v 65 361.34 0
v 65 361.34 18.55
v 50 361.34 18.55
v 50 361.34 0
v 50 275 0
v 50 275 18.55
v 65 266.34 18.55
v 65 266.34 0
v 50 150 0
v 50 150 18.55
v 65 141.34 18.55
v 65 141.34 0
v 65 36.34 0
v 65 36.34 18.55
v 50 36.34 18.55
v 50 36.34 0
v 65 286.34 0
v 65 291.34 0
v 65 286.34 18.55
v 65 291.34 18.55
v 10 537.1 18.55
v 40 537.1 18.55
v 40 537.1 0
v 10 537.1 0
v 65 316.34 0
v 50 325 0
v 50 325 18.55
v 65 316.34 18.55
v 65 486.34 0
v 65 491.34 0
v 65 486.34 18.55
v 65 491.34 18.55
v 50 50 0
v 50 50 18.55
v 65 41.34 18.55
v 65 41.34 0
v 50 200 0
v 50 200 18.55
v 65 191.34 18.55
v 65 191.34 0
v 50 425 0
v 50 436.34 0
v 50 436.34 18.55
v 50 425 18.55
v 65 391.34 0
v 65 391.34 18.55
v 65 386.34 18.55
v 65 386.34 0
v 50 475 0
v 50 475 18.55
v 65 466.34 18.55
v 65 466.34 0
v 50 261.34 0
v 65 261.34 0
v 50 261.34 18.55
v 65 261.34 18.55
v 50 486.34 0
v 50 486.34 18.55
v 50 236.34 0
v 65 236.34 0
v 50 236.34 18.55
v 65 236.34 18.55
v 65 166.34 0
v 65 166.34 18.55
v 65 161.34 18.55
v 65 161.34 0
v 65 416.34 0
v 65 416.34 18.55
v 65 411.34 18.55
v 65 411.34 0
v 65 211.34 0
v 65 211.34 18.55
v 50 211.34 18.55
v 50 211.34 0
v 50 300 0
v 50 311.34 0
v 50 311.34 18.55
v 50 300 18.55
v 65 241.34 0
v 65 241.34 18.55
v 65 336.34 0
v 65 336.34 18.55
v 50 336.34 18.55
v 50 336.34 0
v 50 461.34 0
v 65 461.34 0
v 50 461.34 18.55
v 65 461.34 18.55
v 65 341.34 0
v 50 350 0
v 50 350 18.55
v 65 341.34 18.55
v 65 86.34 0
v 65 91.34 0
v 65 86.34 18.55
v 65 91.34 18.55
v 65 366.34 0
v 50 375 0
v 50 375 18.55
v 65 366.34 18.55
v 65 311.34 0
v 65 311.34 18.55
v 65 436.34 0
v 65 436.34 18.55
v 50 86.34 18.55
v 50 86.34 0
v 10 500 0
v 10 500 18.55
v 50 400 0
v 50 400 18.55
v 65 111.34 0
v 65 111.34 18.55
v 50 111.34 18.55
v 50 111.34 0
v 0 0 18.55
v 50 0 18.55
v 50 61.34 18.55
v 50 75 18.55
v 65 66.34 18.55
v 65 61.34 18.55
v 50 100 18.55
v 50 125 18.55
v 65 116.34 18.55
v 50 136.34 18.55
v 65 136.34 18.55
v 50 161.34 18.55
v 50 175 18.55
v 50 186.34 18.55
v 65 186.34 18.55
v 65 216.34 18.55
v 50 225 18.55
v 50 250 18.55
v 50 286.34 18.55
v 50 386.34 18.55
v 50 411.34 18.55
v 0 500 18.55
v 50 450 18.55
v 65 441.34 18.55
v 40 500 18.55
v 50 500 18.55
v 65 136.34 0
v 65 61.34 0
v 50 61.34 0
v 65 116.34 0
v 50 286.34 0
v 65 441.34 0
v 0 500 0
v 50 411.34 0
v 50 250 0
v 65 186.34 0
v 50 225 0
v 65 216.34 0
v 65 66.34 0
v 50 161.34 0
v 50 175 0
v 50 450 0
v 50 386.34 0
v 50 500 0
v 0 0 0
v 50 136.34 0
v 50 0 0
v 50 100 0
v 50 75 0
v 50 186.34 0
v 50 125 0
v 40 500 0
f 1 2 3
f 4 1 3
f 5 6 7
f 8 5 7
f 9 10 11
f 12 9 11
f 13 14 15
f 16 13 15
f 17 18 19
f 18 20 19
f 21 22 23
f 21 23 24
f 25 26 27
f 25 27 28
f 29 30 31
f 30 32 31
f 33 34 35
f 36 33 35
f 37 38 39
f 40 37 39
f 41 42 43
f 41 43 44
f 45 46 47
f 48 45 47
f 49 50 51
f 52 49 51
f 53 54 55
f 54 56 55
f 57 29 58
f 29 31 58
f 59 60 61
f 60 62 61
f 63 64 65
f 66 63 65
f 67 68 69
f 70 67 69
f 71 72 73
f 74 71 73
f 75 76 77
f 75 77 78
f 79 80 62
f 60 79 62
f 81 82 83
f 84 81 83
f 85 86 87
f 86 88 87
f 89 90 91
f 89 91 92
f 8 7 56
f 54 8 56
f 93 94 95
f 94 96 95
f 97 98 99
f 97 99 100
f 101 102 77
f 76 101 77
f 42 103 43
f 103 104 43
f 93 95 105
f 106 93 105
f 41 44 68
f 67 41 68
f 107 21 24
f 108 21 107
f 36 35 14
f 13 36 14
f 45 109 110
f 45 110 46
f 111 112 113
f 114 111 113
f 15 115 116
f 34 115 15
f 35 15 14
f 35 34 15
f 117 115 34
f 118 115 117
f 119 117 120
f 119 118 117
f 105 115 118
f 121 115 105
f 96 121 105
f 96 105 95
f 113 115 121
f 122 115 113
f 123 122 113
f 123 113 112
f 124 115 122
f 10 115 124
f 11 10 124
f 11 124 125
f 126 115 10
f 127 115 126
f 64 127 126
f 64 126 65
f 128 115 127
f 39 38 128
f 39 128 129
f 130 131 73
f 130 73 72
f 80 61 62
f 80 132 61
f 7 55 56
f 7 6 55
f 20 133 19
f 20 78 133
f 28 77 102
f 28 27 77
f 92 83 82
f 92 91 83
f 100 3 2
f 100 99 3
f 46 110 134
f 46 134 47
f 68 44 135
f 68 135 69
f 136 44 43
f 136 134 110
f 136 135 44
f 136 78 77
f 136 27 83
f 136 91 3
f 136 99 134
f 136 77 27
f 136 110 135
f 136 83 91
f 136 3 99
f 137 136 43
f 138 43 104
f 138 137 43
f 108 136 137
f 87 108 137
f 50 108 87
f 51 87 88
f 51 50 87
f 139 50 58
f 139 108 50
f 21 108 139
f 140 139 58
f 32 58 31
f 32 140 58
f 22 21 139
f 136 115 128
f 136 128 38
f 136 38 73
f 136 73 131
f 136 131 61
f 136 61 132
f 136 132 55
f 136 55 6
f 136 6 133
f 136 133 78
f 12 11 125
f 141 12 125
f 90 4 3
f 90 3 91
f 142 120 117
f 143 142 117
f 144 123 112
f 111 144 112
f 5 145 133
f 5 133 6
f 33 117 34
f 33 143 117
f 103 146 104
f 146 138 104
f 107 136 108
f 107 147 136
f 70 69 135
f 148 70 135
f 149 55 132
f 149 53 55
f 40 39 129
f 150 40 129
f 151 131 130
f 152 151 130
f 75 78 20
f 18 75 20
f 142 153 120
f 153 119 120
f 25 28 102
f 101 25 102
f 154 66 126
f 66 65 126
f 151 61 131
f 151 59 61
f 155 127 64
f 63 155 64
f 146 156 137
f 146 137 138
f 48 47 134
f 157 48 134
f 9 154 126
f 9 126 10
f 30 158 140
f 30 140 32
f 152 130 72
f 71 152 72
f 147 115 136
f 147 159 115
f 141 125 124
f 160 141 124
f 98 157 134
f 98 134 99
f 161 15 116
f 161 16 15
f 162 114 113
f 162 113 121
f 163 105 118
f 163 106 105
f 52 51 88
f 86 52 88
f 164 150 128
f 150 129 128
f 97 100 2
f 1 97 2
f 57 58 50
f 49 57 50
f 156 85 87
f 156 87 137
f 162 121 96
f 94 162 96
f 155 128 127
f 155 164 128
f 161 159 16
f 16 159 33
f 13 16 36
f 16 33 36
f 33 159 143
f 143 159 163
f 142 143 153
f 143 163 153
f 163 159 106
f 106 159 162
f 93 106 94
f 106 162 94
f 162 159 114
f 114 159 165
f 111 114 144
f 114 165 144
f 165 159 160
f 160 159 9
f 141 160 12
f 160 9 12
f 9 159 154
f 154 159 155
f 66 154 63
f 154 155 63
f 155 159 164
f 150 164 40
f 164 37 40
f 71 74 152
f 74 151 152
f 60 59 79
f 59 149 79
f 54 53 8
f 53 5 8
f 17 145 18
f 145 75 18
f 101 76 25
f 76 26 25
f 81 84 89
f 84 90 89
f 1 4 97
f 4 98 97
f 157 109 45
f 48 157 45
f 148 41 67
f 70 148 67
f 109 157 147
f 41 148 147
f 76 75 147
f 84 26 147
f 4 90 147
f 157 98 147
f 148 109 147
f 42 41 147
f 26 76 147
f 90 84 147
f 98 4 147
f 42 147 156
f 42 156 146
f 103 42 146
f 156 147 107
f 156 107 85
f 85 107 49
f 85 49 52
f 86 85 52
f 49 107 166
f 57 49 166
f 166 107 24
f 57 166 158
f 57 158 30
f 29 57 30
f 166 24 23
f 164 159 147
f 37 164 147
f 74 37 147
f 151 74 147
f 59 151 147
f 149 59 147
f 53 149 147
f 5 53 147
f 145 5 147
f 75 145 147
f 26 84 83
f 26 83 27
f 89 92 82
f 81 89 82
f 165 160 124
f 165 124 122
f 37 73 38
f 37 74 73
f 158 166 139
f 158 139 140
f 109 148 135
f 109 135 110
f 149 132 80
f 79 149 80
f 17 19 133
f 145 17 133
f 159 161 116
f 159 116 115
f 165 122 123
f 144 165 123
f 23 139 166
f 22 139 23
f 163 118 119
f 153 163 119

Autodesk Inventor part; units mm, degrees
ref_plane "YZ Plane" through (0, 0, 0) normal (1, 0, 0) x (0, 1, 0)
ref_plane "XZ Plane" through (0, 0, 0) normal (0, 1, 0) x (-1, 0, 0)
ref_plane "XY Plane" through (0, 0, 0) normal (0, 0, 1) x (1, 0, 0)
sketch "Sketch4" plane through (0, 0, 0) normal (0, 0, 1) x (1, 0, 0)
  line L0 (0, 500) -> (50, 500)
  line L1 (50, 500) -> (50, 0)
  line L2 (50, 0) -> (0, 0)
  line L3 (0, 0) -> (0, 500)
  dimension "d31" = 50
  dimension "d32" = 500
extrude "Extrusion1" add sketch "Sketch4" along normal blind 18.55
sketch "Sketch5" plane through (0, 0, 18.55) normal (0, 0, 1) x (1, 0, 0)
  line L0 (50, 500) -> (0, 500) projected
  line L1 (10, 500) -> (40, 500)
  line L2 (40, 500) -> (40, 537.1)
  line L3 (40, 537.1) -> (10, 537.1)
  line L4 (10, 537.1) -> (10, 500)
  line L5 (0, 500) -> (0, 0) projected
  line L6 (50, 0) -> (50, 500) projected
  dimension "d46" = 10
  dimension "d47" = 10
  dimension "d48" = 37.1
extrude "Extrusion2" add sketch "Sketch5" against normal blind 18.55
sketch "Sketch6" plane through (0, 0, 18.55) normal (0, 0, 1) x (1, 0, 0)
  line L0 (50, 500) -> (65, 491.3397)
  line L1 (65, 491.3397) -> (65, 486.3397)
  line L2 (65, 486.3397) -> (50, 486.3397)
  line L3 (50, 500) -> (40, 500) projected
  line L4 (40, 500) -> (50, 500) projected
  line L5 (50, 500) -> (50, 486.3397)
  line L6 (50, 0) -> (50, 500) projected
  line L7 (50, 475) -> (65, 466.3397)
  line L8 (65, 466.3397) -> (65, 461.3397)
  line L9 (65, 461.3397) -> (50, 461.3397)
  line L10 (50, 475) -> (50, 461.3397)
  line L11 (50, 450) -> (65, 441.3397)
  line L12 (65, 441.3397) -> (65, 436.3397)
  line L13 (65, 436.3397) -> (50, 436.3397)
  line L14 (50, 450) -> (50, 436.3397)
  line L15 (50, 425) -> (65, 416.3397)
  line L16 (65, 416.3397) -> (65, 411.3397)
  line L17 (65, 411.3397) -> (50, 411.3397)
  line L18 (50, 425) -> (50, 411.3397)
  line L19 (50, 400) -> (65, 391.3397)
  line L20 (65, 391.3397) -> (65, 386.3397)
  line L21 (65, 386.3397) -> (50, 386.3397)
  line L22 (50, 400) -> (50, 386.3397)
  line L23 (50, 375) -> (65, 366.3397)
  line L24 (65, 366.3397) -> (65, 361.3397)
  line L25 (65, 361.3397) -> (50, 361.3397)
  line L26 (50, 375) -> (50, 361.3397)
  line L27 (50, 350) -> (65, 341.3397)
  line L28 (65, 341.3397) -> (65, 336.3397)
  line L29 (65, 336.3397) -> (50, 336.3397)
  line L30 (50, 350) -> (50, 336.3397)
  line L31 (50, 325) -> (65, 316.3397)
  line L32 (65, 316.3397) -> (65, 311.3397)
  line L33 (65, 311.3397) -> (50, 311.3397)
  line L34 (50, 325) -> (50, 311.3397)
  line L35 (50, 300) -> (65, 291.3397)
  line L36 (65, 291.3397) -> (65, 286.3397)
  line L37 (65, 286.3397) -> (50, 286.3397)
  line L38 (50, 300) -> (50, 286.3397)
  line L39 (50, 275) -> (65, 266.3397)
  line L40 (65, 266.3397) -> (65, 261.3397)
  line L41 (65, 261.3397) -> (50, 261.3397)
  line L42 (50, 275) -> (50, 261.3397)
  line L43 (50, 250) -> (65, 241.3397)
  line L44 (65, 241.3397) -> (65, 236.3397)
  line L45 (65, 236.3397) -> (50, 236.3397)
  line L46 (50, 250) -> (50, 236.3397)
  line L47 (50, 225) -> (65, 216.3397)
  line L48 (65, 216.3397) -> (65, 211.3397)
  line L49 (65, 211.3397) -> (50, 211.3397)
  line L50 (50, 225) -> (50, 211.3397)
  line L51 (50, 200) -> (65, 191.3397)
  line L52 (65, 191.3397) -> (65, 186.3397)
  line L53 (65, 186.3397) -> (50, 186.3397)
  line L54 (50, 200) -> (50, 186.3397)
  line L55 (50, 175) -> (65, 166.3397)
  line L56 (65, 166.3397) -> (65, 161.3397)
  line L57 (65, 161.3397) -> (50, 161.3397)
  line L58 (50, 175) -> (50, 161.3397)
  line L59 (50, 150) -> (65, 141.3397)
  line L60 (65, 141.3397) -> (65, 136.3397)
  line L61 (65, 136.3397) -> (50, 136.3397)
  line L62 (50, 150) -> (50, 136.3397)
  line L63 (50, 125) -> (65, 116.3397)
  line L64 (65, 116.3397) -> (65, 111.3397)
  line L65 (65, 111.3397) -> (50, 111.3397)
  line L66 (50, 125) -> (50, 111.3397)
  line L67 (50, 100) -> (65, 91.3397)
  line L68 (65, 91.3397) -> (65, 86.3397)
  line L69 (65, 86.3397) -> (50, 86.3397)
  line L70 (50, 100) -> (50, 86.3397)
  line L71 (50, 75) -> (65, 66.3397)
  line L72 (65, 66.3397) -> (65, 61.3397)
  line L73 (65, 61.3397) -> (50, 61.3397)
  line L74 (50, 75) -> (50, 61.3397)
  line L75 (50, 50) -> (65, 41.3397)
  line L76 (65, 41.3397) -> (65, 36.3397)
  line L77 (65, 36.3397) -> (50, 36.3397)
  line L78 (50, 50) -> (50, 36.3397)
  line L79 (50, 25) -> (65, 16.3397)
  line L80 (65, 16.3397) -> (65, 11.3397)
  line L81 (65, 11.3397) -> (50, 11.3397)
  line L82 (50, 25) -> (50, 11.3397)
  point P0 (0, 0)
  point P1 (40, 475)
  point P2 (40, 450)
  point P3 (40, 425)
  point P4 (40, 400)
  point P5 (40, 375)
  point P6 (40, 350)
  point P7 (40, 325)
  point P8 (40, 300)
  point P9 (40, 275)
  point P10 (40, 250)
  point P11 (40, 225)
  point P12 (40, 200)
  point P13 (40, 175)
  point P14 (40, 150)
  point P15 (40, 125)
  point P16 (40, 100)
  point P17 (40, 75)
  point P18 (40, 50)
  point P19 (40, 25)
  dimension "d49" = 15
  dimension "d50" = 30
  dimension "d51" = 5
  dimension "d54" = 25
extrude "Extrusion3" add sketch "Sketch6" against normal blind 18.55 contours L75 L76 L77 L6 | L71 L72 L73 L6 | L67 L68 L69 L6 | L63 L64 L65 L6 | L59 L60 L61 L6 | L55 L56 L57 L6 | L51 L52 L53 L6 | L47 L48 L49 L6 | L43 L44 L45 L6 | L39 L40 L41 L6 | L35 L36 L37 L6 | L31 L32 L33 L6 | L27 L28 L29 L6 | L23 L24 L25 L6 | L19 L20 L21 L6 | L15 L16 L17 L6 | L11 L12 L13 L6 | L7 L8 L9 L6 | L0 L1 L2 L5
properties part number "graduated_foot"
